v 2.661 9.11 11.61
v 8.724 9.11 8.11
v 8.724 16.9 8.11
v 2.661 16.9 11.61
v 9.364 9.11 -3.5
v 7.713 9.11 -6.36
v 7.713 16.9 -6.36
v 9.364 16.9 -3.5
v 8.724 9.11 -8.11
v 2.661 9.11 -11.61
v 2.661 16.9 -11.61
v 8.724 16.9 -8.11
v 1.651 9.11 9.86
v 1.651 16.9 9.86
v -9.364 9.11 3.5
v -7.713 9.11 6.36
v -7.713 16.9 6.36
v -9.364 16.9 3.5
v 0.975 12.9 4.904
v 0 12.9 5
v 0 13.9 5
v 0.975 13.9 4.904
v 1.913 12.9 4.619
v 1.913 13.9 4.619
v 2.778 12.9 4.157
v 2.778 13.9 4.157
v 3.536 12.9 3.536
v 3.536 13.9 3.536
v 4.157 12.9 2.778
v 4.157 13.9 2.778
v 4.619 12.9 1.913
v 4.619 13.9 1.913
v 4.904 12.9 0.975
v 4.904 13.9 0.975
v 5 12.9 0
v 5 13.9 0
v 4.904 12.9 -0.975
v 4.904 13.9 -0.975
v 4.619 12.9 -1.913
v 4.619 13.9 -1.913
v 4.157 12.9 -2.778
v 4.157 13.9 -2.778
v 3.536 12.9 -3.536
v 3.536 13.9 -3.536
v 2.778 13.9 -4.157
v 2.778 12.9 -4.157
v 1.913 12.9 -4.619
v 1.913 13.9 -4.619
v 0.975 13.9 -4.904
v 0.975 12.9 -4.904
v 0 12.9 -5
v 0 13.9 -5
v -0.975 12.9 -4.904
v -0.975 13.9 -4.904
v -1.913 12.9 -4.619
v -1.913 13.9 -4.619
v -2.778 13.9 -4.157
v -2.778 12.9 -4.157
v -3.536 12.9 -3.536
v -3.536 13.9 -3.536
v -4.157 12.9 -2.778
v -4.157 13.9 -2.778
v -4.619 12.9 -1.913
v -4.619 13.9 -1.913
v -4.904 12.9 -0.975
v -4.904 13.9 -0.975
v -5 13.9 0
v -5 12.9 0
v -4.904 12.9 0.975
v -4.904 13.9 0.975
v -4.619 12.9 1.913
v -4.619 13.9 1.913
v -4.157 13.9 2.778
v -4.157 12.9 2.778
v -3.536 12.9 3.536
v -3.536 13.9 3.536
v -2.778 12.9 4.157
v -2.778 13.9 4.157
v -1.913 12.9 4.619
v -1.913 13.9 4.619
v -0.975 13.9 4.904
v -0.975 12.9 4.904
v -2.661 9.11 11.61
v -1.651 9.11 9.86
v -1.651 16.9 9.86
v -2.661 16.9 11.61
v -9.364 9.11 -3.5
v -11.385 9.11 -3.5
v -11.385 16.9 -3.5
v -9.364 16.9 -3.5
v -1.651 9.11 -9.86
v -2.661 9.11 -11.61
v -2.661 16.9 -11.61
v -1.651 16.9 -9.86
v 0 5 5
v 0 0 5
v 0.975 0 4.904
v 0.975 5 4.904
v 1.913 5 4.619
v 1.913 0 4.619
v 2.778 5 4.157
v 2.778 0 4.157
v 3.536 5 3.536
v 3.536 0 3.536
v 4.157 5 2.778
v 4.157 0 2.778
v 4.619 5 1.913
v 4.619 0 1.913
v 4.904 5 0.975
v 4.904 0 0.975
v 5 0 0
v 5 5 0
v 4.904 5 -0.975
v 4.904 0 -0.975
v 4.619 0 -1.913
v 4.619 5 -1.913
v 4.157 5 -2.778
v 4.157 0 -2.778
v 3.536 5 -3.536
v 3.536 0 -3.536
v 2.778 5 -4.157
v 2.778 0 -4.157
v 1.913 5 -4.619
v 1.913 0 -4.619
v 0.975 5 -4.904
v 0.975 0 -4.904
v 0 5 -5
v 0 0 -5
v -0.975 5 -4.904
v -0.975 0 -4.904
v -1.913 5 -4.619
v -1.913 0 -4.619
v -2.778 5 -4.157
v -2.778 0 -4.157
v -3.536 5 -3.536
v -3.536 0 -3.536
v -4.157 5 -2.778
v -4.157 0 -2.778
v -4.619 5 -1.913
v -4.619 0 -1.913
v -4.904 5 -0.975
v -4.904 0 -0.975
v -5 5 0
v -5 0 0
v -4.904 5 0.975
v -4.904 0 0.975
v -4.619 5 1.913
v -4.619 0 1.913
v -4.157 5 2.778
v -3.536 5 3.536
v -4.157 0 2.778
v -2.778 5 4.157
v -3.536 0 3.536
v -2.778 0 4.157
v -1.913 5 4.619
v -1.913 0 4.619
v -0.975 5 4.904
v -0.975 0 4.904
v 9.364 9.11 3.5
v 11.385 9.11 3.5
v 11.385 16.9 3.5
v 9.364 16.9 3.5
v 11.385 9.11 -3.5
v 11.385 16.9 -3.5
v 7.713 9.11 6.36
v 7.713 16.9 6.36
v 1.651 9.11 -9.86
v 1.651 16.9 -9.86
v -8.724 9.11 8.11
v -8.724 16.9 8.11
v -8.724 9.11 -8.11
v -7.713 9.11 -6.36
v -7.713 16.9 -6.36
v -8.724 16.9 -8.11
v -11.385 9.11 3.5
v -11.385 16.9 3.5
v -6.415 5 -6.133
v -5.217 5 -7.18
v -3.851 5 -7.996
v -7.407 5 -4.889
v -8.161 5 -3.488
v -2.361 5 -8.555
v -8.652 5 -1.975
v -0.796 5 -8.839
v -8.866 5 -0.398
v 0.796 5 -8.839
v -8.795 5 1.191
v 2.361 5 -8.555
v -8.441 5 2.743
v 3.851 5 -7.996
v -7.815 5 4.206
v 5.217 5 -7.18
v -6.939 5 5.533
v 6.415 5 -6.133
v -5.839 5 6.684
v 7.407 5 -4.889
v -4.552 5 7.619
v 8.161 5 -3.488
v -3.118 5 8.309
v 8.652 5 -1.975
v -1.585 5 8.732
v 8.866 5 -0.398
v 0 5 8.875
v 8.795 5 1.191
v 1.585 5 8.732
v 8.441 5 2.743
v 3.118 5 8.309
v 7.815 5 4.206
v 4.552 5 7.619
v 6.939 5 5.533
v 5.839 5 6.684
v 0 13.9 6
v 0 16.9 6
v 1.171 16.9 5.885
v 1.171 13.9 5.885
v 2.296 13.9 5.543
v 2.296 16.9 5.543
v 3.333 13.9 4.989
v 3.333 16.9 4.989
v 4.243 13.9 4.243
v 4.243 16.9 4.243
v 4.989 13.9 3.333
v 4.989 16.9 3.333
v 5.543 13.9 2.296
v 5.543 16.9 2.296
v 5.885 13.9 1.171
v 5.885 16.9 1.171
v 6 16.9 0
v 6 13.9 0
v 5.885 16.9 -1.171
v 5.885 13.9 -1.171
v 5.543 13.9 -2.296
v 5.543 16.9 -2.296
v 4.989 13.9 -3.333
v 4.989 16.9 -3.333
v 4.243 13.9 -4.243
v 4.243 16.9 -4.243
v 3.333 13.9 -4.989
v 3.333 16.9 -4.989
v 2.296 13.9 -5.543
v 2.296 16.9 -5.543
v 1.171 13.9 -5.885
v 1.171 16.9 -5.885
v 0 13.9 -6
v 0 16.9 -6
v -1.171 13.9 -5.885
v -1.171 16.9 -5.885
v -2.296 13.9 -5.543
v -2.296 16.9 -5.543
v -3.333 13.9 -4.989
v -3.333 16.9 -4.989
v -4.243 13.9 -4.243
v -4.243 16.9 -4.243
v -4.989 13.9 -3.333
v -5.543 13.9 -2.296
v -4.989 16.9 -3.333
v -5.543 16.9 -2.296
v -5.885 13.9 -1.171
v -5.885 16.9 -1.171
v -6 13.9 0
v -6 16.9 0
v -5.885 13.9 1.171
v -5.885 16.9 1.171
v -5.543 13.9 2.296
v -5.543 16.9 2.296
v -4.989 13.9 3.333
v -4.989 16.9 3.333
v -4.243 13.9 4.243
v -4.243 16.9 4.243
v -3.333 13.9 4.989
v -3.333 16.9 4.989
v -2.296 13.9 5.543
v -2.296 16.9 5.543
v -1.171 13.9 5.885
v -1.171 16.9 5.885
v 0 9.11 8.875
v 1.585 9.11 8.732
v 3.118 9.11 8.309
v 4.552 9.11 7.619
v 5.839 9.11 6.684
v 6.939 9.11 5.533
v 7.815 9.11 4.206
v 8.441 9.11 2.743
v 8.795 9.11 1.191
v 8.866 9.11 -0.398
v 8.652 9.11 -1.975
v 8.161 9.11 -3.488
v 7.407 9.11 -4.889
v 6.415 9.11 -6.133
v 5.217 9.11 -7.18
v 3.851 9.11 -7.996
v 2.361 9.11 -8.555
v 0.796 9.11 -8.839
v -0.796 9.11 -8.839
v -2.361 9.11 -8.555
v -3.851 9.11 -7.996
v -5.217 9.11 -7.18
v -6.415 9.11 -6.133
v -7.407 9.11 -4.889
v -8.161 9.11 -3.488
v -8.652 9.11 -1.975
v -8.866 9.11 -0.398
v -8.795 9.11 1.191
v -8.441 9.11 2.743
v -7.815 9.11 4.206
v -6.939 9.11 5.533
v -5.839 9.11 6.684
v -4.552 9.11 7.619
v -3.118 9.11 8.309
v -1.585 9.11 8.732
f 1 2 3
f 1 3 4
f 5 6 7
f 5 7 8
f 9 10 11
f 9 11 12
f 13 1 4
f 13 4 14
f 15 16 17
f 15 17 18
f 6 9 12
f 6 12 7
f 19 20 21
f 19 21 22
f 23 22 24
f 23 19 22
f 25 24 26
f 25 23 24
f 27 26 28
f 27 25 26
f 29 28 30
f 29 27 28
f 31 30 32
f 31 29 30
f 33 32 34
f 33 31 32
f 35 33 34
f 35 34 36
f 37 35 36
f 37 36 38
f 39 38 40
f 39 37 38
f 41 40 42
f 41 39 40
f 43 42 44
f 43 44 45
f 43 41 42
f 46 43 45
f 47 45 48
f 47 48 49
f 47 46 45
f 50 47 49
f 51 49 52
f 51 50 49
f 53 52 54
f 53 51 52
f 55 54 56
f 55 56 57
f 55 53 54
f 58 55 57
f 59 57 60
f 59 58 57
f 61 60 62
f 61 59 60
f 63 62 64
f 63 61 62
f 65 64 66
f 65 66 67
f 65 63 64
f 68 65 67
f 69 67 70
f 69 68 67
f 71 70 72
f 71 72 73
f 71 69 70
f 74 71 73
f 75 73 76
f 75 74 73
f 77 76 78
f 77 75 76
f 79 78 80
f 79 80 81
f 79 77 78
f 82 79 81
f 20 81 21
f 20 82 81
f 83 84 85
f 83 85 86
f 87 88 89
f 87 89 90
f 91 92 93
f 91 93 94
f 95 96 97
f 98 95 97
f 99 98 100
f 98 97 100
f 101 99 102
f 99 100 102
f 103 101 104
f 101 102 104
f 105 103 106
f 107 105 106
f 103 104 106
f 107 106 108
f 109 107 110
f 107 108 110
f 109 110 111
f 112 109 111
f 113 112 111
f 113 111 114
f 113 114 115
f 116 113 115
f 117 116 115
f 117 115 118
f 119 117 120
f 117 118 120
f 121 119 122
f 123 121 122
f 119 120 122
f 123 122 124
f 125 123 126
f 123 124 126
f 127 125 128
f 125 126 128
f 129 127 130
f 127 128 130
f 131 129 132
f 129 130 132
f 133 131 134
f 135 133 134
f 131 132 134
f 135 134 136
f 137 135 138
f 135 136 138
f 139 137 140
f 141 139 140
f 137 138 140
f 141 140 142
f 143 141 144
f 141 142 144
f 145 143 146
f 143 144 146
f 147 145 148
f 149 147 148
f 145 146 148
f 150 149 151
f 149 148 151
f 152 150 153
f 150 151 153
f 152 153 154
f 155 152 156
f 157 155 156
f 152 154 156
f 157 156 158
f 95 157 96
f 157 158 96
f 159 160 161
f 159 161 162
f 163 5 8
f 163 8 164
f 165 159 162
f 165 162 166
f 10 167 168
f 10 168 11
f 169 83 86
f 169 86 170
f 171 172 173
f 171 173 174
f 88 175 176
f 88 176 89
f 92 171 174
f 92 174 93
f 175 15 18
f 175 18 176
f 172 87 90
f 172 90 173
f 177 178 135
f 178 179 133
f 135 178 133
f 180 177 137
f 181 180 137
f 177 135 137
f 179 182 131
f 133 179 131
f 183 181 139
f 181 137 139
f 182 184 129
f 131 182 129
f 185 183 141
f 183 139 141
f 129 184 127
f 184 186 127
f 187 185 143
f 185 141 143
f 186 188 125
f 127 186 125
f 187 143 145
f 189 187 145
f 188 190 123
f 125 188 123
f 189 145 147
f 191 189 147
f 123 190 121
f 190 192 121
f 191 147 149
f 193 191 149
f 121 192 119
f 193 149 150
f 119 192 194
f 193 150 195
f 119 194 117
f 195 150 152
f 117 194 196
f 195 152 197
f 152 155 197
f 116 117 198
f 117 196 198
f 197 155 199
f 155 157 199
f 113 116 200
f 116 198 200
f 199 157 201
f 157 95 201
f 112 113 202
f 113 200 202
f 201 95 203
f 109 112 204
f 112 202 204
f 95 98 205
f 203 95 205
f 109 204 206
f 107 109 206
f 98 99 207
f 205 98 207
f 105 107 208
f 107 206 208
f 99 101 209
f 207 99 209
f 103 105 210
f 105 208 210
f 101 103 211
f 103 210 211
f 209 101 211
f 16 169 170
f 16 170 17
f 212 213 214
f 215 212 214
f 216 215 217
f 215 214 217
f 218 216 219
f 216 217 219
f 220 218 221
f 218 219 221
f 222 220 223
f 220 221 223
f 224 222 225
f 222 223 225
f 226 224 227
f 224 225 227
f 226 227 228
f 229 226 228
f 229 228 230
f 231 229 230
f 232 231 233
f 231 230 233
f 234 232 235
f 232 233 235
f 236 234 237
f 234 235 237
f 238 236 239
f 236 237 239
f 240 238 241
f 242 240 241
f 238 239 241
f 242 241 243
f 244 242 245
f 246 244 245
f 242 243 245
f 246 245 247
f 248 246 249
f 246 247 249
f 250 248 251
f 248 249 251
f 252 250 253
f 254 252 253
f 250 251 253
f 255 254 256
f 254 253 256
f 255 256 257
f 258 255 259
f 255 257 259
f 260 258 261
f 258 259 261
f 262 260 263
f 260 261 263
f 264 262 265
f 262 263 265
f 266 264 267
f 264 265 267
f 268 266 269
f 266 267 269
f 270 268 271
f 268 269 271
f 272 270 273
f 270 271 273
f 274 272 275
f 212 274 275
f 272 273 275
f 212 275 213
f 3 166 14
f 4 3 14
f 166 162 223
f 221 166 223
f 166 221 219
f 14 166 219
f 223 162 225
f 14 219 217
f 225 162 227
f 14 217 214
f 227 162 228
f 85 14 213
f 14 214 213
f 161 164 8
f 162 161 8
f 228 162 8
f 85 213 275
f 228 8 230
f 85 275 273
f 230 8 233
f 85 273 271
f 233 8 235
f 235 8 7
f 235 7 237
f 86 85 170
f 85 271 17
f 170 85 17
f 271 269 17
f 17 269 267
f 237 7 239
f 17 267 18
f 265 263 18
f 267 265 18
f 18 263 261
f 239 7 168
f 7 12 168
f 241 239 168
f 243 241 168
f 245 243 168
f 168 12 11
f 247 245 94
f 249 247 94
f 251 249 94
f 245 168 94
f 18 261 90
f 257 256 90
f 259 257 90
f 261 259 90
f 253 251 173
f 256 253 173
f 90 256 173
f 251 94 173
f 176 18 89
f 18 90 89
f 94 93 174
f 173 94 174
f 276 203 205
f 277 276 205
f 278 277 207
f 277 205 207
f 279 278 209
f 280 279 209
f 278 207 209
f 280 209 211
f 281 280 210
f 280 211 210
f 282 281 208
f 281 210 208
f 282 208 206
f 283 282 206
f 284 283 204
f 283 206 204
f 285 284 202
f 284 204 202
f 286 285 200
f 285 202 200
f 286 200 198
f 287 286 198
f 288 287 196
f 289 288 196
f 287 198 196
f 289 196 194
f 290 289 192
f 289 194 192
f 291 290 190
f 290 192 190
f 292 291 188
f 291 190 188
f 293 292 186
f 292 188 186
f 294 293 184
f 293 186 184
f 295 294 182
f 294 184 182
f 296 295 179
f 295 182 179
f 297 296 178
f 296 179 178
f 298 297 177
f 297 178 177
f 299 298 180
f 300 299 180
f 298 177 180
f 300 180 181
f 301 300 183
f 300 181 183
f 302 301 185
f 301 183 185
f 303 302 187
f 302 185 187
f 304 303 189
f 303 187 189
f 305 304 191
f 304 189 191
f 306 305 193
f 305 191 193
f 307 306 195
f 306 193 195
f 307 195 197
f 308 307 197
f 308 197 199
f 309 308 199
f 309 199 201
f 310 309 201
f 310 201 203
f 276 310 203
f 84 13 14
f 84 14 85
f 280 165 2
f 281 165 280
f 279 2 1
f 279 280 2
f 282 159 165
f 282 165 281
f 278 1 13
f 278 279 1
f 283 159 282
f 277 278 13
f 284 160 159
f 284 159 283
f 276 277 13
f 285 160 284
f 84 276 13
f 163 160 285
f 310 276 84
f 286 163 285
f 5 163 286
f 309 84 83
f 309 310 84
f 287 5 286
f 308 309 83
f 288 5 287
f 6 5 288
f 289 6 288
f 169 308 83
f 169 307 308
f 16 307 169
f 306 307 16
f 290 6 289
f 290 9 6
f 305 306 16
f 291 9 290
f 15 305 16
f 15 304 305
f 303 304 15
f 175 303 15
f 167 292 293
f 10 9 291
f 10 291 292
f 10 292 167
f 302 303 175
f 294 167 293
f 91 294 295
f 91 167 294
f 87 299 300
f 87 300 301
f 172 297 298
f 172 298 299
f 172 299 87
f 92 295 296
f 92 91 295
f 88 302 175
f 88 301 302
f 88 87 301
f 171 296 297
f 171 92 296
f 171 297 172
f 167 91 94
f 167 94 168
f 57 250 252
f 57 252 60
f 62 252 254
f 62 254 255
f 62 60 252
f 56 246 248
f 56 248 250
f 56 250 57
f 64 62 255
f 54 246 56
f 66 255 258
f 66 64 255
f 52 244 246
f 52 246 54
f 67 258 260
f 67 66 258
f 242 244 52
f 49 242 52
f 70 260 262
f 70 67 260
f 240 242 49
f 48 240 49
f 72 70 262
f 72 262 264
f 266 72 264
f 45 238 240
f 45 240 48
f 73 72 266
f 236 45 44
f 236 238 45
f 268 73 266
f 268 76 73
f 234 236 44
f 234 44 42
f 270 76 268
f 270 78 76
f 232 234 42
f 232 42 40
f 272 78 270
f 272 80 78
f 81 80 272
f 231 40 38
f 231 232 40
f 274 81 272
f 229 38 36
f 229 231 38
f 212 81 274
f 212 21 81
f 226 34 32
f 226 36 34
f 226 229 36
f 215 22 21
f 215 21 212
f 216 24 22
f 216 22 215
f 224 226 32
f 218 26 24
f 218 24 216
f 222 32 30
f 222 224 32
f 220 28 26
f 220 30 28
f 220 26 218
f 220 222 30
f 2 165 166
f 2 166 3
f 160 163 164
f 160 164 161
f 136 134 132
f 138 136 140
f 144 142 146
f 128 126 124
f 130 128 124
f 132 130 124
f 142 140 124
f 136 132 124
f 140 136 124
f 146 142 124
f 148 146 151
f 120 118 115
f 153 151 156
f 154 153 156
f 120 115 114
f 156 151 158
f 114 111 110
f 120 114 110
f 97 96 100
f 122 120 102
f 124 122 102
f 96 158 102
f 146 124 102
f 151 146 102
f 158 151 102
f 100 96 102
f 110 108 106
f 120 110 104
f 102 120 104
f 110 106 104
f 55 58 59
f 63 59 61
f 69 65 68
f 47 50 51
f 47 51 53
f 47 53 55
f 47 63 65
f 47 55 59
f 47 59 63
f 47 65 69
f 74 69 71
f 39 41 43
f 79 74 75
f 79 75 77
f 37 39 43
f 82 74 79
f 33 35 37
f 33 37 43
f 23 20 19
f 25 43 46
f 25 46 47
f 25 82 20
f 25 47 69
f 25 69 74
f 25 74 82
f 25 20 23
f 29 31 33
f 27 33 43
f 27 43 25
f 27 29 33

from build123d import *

# Parameters (mm, degrees)
SKETCH1_R           = 5
BOSS_EXTRUDE1_DEPTH = 5
SKETCH2_R           = 8.875
BOSS_EXTRUDE2_DEPTH = 4.11
BOSS_EXTRUDE3_DEPTH = 7.79
SKETCH4_R           = 6
CUT_EXTRUDE1_DEPTH  = 3
CUT_EXTRUDE2_START  = -1
SKETCH5_R           = 5
CUT_EXTRUDE2_DEPTH  = 1


with BuildPart() as part:
    # Sketch1 → Boss-Extrude1 (new body)
    with BuildSketch(Plane(origin=(0, 0, 0), x_dir=(1, 0, 0), z_dir=(0, 1, 0))):
        with Locations(Location((0, 0, 0), (0, 0, 270))):
            Circle(SKETCH1_R)
    extrude(amount=BOSS_EXTRUDE1_DEPTH)

    # Sketch2 → Boss-Extrude2 (add)
    with BuildSketch(Plane(origin=(0, 5, 0), x_dir=(1, 0, 0), z_dir=(0, 1, 0))):
        with Locations(Location((0, 0, 0), (0, 0, 270))):
            Circle(SKETCH2_R)
    extrude(amount=BOSS_EXTRUDE2_DEPTH)

    # Sketch3 → Boss-Extrude3 (add)
    with BuildSketch(Plane(origin=(0, 9.11, 0), x_dir=(1, 0, 0), z_dir=(0, 1, 0))):
        Polygon((9.364274058, 3.5), (11.385, 3.5), (11.385, -3.5), (9.364274058, -3.5), (7.713225942, -6.359699222), (8.723588913, -8.109699222), (2.661411087, -11.609699222), (1.651048116, -9.859699222), (-1.651048116, -9.859699222), (-2.661411087, -11.609699222), (-8.723588913, -8.109699222), (-7.713225942, -6.359699222), (-9.364274058, -3.5), (-11.385, -3.5), (-11.385, 3.5), (-9.364274058, 3.5), (-7.713225942, 6.359699222), (-8.723588913, 8.109699222), (-2.661411087, 11.609699222), (-1.651048116, 9.859699222), (1.651048116, 9.859699222), (2.661411087, 11.609699222), (8.723588913, 8.109699222), (7.713225942, 6.359699222), align=None)
    extrude(amount=BOSS_EXTRUDE3_DEPTH)

    # Sketch4 → Cut-Extrude1 (cut)
    with BuildSketch(Plane(origin=(0, 16.9, 0), x_dir=(1, 0, 0), z_dir=(0, 1, 0))):
        with Locations(Location((0, 0, 0), (0, 0, 270))):
            Circle(SKETCH4_R)
    extrude(amount=-CUT_EXTRUDE1_DEPTH, mode=Mode.SUBTRACT)

    # Sketch5 → Cut-Extrude2 (cut)
    with BuildSketch(Plane(origin=(0, 13.9, 0), x_dir=(1, 0, 0), z_dir=(0, 1, 0)).offset(CUT_EXTRUDE2_START)):
        with Locations(Location((0, 0, 0), (0, 0, 270))):
            Circle(SKETCH5_R)
    extrude(amount=CUT_EXTRUDE2_DEPTH, mode=Mode.SUBTRACT)


solid = part.part
